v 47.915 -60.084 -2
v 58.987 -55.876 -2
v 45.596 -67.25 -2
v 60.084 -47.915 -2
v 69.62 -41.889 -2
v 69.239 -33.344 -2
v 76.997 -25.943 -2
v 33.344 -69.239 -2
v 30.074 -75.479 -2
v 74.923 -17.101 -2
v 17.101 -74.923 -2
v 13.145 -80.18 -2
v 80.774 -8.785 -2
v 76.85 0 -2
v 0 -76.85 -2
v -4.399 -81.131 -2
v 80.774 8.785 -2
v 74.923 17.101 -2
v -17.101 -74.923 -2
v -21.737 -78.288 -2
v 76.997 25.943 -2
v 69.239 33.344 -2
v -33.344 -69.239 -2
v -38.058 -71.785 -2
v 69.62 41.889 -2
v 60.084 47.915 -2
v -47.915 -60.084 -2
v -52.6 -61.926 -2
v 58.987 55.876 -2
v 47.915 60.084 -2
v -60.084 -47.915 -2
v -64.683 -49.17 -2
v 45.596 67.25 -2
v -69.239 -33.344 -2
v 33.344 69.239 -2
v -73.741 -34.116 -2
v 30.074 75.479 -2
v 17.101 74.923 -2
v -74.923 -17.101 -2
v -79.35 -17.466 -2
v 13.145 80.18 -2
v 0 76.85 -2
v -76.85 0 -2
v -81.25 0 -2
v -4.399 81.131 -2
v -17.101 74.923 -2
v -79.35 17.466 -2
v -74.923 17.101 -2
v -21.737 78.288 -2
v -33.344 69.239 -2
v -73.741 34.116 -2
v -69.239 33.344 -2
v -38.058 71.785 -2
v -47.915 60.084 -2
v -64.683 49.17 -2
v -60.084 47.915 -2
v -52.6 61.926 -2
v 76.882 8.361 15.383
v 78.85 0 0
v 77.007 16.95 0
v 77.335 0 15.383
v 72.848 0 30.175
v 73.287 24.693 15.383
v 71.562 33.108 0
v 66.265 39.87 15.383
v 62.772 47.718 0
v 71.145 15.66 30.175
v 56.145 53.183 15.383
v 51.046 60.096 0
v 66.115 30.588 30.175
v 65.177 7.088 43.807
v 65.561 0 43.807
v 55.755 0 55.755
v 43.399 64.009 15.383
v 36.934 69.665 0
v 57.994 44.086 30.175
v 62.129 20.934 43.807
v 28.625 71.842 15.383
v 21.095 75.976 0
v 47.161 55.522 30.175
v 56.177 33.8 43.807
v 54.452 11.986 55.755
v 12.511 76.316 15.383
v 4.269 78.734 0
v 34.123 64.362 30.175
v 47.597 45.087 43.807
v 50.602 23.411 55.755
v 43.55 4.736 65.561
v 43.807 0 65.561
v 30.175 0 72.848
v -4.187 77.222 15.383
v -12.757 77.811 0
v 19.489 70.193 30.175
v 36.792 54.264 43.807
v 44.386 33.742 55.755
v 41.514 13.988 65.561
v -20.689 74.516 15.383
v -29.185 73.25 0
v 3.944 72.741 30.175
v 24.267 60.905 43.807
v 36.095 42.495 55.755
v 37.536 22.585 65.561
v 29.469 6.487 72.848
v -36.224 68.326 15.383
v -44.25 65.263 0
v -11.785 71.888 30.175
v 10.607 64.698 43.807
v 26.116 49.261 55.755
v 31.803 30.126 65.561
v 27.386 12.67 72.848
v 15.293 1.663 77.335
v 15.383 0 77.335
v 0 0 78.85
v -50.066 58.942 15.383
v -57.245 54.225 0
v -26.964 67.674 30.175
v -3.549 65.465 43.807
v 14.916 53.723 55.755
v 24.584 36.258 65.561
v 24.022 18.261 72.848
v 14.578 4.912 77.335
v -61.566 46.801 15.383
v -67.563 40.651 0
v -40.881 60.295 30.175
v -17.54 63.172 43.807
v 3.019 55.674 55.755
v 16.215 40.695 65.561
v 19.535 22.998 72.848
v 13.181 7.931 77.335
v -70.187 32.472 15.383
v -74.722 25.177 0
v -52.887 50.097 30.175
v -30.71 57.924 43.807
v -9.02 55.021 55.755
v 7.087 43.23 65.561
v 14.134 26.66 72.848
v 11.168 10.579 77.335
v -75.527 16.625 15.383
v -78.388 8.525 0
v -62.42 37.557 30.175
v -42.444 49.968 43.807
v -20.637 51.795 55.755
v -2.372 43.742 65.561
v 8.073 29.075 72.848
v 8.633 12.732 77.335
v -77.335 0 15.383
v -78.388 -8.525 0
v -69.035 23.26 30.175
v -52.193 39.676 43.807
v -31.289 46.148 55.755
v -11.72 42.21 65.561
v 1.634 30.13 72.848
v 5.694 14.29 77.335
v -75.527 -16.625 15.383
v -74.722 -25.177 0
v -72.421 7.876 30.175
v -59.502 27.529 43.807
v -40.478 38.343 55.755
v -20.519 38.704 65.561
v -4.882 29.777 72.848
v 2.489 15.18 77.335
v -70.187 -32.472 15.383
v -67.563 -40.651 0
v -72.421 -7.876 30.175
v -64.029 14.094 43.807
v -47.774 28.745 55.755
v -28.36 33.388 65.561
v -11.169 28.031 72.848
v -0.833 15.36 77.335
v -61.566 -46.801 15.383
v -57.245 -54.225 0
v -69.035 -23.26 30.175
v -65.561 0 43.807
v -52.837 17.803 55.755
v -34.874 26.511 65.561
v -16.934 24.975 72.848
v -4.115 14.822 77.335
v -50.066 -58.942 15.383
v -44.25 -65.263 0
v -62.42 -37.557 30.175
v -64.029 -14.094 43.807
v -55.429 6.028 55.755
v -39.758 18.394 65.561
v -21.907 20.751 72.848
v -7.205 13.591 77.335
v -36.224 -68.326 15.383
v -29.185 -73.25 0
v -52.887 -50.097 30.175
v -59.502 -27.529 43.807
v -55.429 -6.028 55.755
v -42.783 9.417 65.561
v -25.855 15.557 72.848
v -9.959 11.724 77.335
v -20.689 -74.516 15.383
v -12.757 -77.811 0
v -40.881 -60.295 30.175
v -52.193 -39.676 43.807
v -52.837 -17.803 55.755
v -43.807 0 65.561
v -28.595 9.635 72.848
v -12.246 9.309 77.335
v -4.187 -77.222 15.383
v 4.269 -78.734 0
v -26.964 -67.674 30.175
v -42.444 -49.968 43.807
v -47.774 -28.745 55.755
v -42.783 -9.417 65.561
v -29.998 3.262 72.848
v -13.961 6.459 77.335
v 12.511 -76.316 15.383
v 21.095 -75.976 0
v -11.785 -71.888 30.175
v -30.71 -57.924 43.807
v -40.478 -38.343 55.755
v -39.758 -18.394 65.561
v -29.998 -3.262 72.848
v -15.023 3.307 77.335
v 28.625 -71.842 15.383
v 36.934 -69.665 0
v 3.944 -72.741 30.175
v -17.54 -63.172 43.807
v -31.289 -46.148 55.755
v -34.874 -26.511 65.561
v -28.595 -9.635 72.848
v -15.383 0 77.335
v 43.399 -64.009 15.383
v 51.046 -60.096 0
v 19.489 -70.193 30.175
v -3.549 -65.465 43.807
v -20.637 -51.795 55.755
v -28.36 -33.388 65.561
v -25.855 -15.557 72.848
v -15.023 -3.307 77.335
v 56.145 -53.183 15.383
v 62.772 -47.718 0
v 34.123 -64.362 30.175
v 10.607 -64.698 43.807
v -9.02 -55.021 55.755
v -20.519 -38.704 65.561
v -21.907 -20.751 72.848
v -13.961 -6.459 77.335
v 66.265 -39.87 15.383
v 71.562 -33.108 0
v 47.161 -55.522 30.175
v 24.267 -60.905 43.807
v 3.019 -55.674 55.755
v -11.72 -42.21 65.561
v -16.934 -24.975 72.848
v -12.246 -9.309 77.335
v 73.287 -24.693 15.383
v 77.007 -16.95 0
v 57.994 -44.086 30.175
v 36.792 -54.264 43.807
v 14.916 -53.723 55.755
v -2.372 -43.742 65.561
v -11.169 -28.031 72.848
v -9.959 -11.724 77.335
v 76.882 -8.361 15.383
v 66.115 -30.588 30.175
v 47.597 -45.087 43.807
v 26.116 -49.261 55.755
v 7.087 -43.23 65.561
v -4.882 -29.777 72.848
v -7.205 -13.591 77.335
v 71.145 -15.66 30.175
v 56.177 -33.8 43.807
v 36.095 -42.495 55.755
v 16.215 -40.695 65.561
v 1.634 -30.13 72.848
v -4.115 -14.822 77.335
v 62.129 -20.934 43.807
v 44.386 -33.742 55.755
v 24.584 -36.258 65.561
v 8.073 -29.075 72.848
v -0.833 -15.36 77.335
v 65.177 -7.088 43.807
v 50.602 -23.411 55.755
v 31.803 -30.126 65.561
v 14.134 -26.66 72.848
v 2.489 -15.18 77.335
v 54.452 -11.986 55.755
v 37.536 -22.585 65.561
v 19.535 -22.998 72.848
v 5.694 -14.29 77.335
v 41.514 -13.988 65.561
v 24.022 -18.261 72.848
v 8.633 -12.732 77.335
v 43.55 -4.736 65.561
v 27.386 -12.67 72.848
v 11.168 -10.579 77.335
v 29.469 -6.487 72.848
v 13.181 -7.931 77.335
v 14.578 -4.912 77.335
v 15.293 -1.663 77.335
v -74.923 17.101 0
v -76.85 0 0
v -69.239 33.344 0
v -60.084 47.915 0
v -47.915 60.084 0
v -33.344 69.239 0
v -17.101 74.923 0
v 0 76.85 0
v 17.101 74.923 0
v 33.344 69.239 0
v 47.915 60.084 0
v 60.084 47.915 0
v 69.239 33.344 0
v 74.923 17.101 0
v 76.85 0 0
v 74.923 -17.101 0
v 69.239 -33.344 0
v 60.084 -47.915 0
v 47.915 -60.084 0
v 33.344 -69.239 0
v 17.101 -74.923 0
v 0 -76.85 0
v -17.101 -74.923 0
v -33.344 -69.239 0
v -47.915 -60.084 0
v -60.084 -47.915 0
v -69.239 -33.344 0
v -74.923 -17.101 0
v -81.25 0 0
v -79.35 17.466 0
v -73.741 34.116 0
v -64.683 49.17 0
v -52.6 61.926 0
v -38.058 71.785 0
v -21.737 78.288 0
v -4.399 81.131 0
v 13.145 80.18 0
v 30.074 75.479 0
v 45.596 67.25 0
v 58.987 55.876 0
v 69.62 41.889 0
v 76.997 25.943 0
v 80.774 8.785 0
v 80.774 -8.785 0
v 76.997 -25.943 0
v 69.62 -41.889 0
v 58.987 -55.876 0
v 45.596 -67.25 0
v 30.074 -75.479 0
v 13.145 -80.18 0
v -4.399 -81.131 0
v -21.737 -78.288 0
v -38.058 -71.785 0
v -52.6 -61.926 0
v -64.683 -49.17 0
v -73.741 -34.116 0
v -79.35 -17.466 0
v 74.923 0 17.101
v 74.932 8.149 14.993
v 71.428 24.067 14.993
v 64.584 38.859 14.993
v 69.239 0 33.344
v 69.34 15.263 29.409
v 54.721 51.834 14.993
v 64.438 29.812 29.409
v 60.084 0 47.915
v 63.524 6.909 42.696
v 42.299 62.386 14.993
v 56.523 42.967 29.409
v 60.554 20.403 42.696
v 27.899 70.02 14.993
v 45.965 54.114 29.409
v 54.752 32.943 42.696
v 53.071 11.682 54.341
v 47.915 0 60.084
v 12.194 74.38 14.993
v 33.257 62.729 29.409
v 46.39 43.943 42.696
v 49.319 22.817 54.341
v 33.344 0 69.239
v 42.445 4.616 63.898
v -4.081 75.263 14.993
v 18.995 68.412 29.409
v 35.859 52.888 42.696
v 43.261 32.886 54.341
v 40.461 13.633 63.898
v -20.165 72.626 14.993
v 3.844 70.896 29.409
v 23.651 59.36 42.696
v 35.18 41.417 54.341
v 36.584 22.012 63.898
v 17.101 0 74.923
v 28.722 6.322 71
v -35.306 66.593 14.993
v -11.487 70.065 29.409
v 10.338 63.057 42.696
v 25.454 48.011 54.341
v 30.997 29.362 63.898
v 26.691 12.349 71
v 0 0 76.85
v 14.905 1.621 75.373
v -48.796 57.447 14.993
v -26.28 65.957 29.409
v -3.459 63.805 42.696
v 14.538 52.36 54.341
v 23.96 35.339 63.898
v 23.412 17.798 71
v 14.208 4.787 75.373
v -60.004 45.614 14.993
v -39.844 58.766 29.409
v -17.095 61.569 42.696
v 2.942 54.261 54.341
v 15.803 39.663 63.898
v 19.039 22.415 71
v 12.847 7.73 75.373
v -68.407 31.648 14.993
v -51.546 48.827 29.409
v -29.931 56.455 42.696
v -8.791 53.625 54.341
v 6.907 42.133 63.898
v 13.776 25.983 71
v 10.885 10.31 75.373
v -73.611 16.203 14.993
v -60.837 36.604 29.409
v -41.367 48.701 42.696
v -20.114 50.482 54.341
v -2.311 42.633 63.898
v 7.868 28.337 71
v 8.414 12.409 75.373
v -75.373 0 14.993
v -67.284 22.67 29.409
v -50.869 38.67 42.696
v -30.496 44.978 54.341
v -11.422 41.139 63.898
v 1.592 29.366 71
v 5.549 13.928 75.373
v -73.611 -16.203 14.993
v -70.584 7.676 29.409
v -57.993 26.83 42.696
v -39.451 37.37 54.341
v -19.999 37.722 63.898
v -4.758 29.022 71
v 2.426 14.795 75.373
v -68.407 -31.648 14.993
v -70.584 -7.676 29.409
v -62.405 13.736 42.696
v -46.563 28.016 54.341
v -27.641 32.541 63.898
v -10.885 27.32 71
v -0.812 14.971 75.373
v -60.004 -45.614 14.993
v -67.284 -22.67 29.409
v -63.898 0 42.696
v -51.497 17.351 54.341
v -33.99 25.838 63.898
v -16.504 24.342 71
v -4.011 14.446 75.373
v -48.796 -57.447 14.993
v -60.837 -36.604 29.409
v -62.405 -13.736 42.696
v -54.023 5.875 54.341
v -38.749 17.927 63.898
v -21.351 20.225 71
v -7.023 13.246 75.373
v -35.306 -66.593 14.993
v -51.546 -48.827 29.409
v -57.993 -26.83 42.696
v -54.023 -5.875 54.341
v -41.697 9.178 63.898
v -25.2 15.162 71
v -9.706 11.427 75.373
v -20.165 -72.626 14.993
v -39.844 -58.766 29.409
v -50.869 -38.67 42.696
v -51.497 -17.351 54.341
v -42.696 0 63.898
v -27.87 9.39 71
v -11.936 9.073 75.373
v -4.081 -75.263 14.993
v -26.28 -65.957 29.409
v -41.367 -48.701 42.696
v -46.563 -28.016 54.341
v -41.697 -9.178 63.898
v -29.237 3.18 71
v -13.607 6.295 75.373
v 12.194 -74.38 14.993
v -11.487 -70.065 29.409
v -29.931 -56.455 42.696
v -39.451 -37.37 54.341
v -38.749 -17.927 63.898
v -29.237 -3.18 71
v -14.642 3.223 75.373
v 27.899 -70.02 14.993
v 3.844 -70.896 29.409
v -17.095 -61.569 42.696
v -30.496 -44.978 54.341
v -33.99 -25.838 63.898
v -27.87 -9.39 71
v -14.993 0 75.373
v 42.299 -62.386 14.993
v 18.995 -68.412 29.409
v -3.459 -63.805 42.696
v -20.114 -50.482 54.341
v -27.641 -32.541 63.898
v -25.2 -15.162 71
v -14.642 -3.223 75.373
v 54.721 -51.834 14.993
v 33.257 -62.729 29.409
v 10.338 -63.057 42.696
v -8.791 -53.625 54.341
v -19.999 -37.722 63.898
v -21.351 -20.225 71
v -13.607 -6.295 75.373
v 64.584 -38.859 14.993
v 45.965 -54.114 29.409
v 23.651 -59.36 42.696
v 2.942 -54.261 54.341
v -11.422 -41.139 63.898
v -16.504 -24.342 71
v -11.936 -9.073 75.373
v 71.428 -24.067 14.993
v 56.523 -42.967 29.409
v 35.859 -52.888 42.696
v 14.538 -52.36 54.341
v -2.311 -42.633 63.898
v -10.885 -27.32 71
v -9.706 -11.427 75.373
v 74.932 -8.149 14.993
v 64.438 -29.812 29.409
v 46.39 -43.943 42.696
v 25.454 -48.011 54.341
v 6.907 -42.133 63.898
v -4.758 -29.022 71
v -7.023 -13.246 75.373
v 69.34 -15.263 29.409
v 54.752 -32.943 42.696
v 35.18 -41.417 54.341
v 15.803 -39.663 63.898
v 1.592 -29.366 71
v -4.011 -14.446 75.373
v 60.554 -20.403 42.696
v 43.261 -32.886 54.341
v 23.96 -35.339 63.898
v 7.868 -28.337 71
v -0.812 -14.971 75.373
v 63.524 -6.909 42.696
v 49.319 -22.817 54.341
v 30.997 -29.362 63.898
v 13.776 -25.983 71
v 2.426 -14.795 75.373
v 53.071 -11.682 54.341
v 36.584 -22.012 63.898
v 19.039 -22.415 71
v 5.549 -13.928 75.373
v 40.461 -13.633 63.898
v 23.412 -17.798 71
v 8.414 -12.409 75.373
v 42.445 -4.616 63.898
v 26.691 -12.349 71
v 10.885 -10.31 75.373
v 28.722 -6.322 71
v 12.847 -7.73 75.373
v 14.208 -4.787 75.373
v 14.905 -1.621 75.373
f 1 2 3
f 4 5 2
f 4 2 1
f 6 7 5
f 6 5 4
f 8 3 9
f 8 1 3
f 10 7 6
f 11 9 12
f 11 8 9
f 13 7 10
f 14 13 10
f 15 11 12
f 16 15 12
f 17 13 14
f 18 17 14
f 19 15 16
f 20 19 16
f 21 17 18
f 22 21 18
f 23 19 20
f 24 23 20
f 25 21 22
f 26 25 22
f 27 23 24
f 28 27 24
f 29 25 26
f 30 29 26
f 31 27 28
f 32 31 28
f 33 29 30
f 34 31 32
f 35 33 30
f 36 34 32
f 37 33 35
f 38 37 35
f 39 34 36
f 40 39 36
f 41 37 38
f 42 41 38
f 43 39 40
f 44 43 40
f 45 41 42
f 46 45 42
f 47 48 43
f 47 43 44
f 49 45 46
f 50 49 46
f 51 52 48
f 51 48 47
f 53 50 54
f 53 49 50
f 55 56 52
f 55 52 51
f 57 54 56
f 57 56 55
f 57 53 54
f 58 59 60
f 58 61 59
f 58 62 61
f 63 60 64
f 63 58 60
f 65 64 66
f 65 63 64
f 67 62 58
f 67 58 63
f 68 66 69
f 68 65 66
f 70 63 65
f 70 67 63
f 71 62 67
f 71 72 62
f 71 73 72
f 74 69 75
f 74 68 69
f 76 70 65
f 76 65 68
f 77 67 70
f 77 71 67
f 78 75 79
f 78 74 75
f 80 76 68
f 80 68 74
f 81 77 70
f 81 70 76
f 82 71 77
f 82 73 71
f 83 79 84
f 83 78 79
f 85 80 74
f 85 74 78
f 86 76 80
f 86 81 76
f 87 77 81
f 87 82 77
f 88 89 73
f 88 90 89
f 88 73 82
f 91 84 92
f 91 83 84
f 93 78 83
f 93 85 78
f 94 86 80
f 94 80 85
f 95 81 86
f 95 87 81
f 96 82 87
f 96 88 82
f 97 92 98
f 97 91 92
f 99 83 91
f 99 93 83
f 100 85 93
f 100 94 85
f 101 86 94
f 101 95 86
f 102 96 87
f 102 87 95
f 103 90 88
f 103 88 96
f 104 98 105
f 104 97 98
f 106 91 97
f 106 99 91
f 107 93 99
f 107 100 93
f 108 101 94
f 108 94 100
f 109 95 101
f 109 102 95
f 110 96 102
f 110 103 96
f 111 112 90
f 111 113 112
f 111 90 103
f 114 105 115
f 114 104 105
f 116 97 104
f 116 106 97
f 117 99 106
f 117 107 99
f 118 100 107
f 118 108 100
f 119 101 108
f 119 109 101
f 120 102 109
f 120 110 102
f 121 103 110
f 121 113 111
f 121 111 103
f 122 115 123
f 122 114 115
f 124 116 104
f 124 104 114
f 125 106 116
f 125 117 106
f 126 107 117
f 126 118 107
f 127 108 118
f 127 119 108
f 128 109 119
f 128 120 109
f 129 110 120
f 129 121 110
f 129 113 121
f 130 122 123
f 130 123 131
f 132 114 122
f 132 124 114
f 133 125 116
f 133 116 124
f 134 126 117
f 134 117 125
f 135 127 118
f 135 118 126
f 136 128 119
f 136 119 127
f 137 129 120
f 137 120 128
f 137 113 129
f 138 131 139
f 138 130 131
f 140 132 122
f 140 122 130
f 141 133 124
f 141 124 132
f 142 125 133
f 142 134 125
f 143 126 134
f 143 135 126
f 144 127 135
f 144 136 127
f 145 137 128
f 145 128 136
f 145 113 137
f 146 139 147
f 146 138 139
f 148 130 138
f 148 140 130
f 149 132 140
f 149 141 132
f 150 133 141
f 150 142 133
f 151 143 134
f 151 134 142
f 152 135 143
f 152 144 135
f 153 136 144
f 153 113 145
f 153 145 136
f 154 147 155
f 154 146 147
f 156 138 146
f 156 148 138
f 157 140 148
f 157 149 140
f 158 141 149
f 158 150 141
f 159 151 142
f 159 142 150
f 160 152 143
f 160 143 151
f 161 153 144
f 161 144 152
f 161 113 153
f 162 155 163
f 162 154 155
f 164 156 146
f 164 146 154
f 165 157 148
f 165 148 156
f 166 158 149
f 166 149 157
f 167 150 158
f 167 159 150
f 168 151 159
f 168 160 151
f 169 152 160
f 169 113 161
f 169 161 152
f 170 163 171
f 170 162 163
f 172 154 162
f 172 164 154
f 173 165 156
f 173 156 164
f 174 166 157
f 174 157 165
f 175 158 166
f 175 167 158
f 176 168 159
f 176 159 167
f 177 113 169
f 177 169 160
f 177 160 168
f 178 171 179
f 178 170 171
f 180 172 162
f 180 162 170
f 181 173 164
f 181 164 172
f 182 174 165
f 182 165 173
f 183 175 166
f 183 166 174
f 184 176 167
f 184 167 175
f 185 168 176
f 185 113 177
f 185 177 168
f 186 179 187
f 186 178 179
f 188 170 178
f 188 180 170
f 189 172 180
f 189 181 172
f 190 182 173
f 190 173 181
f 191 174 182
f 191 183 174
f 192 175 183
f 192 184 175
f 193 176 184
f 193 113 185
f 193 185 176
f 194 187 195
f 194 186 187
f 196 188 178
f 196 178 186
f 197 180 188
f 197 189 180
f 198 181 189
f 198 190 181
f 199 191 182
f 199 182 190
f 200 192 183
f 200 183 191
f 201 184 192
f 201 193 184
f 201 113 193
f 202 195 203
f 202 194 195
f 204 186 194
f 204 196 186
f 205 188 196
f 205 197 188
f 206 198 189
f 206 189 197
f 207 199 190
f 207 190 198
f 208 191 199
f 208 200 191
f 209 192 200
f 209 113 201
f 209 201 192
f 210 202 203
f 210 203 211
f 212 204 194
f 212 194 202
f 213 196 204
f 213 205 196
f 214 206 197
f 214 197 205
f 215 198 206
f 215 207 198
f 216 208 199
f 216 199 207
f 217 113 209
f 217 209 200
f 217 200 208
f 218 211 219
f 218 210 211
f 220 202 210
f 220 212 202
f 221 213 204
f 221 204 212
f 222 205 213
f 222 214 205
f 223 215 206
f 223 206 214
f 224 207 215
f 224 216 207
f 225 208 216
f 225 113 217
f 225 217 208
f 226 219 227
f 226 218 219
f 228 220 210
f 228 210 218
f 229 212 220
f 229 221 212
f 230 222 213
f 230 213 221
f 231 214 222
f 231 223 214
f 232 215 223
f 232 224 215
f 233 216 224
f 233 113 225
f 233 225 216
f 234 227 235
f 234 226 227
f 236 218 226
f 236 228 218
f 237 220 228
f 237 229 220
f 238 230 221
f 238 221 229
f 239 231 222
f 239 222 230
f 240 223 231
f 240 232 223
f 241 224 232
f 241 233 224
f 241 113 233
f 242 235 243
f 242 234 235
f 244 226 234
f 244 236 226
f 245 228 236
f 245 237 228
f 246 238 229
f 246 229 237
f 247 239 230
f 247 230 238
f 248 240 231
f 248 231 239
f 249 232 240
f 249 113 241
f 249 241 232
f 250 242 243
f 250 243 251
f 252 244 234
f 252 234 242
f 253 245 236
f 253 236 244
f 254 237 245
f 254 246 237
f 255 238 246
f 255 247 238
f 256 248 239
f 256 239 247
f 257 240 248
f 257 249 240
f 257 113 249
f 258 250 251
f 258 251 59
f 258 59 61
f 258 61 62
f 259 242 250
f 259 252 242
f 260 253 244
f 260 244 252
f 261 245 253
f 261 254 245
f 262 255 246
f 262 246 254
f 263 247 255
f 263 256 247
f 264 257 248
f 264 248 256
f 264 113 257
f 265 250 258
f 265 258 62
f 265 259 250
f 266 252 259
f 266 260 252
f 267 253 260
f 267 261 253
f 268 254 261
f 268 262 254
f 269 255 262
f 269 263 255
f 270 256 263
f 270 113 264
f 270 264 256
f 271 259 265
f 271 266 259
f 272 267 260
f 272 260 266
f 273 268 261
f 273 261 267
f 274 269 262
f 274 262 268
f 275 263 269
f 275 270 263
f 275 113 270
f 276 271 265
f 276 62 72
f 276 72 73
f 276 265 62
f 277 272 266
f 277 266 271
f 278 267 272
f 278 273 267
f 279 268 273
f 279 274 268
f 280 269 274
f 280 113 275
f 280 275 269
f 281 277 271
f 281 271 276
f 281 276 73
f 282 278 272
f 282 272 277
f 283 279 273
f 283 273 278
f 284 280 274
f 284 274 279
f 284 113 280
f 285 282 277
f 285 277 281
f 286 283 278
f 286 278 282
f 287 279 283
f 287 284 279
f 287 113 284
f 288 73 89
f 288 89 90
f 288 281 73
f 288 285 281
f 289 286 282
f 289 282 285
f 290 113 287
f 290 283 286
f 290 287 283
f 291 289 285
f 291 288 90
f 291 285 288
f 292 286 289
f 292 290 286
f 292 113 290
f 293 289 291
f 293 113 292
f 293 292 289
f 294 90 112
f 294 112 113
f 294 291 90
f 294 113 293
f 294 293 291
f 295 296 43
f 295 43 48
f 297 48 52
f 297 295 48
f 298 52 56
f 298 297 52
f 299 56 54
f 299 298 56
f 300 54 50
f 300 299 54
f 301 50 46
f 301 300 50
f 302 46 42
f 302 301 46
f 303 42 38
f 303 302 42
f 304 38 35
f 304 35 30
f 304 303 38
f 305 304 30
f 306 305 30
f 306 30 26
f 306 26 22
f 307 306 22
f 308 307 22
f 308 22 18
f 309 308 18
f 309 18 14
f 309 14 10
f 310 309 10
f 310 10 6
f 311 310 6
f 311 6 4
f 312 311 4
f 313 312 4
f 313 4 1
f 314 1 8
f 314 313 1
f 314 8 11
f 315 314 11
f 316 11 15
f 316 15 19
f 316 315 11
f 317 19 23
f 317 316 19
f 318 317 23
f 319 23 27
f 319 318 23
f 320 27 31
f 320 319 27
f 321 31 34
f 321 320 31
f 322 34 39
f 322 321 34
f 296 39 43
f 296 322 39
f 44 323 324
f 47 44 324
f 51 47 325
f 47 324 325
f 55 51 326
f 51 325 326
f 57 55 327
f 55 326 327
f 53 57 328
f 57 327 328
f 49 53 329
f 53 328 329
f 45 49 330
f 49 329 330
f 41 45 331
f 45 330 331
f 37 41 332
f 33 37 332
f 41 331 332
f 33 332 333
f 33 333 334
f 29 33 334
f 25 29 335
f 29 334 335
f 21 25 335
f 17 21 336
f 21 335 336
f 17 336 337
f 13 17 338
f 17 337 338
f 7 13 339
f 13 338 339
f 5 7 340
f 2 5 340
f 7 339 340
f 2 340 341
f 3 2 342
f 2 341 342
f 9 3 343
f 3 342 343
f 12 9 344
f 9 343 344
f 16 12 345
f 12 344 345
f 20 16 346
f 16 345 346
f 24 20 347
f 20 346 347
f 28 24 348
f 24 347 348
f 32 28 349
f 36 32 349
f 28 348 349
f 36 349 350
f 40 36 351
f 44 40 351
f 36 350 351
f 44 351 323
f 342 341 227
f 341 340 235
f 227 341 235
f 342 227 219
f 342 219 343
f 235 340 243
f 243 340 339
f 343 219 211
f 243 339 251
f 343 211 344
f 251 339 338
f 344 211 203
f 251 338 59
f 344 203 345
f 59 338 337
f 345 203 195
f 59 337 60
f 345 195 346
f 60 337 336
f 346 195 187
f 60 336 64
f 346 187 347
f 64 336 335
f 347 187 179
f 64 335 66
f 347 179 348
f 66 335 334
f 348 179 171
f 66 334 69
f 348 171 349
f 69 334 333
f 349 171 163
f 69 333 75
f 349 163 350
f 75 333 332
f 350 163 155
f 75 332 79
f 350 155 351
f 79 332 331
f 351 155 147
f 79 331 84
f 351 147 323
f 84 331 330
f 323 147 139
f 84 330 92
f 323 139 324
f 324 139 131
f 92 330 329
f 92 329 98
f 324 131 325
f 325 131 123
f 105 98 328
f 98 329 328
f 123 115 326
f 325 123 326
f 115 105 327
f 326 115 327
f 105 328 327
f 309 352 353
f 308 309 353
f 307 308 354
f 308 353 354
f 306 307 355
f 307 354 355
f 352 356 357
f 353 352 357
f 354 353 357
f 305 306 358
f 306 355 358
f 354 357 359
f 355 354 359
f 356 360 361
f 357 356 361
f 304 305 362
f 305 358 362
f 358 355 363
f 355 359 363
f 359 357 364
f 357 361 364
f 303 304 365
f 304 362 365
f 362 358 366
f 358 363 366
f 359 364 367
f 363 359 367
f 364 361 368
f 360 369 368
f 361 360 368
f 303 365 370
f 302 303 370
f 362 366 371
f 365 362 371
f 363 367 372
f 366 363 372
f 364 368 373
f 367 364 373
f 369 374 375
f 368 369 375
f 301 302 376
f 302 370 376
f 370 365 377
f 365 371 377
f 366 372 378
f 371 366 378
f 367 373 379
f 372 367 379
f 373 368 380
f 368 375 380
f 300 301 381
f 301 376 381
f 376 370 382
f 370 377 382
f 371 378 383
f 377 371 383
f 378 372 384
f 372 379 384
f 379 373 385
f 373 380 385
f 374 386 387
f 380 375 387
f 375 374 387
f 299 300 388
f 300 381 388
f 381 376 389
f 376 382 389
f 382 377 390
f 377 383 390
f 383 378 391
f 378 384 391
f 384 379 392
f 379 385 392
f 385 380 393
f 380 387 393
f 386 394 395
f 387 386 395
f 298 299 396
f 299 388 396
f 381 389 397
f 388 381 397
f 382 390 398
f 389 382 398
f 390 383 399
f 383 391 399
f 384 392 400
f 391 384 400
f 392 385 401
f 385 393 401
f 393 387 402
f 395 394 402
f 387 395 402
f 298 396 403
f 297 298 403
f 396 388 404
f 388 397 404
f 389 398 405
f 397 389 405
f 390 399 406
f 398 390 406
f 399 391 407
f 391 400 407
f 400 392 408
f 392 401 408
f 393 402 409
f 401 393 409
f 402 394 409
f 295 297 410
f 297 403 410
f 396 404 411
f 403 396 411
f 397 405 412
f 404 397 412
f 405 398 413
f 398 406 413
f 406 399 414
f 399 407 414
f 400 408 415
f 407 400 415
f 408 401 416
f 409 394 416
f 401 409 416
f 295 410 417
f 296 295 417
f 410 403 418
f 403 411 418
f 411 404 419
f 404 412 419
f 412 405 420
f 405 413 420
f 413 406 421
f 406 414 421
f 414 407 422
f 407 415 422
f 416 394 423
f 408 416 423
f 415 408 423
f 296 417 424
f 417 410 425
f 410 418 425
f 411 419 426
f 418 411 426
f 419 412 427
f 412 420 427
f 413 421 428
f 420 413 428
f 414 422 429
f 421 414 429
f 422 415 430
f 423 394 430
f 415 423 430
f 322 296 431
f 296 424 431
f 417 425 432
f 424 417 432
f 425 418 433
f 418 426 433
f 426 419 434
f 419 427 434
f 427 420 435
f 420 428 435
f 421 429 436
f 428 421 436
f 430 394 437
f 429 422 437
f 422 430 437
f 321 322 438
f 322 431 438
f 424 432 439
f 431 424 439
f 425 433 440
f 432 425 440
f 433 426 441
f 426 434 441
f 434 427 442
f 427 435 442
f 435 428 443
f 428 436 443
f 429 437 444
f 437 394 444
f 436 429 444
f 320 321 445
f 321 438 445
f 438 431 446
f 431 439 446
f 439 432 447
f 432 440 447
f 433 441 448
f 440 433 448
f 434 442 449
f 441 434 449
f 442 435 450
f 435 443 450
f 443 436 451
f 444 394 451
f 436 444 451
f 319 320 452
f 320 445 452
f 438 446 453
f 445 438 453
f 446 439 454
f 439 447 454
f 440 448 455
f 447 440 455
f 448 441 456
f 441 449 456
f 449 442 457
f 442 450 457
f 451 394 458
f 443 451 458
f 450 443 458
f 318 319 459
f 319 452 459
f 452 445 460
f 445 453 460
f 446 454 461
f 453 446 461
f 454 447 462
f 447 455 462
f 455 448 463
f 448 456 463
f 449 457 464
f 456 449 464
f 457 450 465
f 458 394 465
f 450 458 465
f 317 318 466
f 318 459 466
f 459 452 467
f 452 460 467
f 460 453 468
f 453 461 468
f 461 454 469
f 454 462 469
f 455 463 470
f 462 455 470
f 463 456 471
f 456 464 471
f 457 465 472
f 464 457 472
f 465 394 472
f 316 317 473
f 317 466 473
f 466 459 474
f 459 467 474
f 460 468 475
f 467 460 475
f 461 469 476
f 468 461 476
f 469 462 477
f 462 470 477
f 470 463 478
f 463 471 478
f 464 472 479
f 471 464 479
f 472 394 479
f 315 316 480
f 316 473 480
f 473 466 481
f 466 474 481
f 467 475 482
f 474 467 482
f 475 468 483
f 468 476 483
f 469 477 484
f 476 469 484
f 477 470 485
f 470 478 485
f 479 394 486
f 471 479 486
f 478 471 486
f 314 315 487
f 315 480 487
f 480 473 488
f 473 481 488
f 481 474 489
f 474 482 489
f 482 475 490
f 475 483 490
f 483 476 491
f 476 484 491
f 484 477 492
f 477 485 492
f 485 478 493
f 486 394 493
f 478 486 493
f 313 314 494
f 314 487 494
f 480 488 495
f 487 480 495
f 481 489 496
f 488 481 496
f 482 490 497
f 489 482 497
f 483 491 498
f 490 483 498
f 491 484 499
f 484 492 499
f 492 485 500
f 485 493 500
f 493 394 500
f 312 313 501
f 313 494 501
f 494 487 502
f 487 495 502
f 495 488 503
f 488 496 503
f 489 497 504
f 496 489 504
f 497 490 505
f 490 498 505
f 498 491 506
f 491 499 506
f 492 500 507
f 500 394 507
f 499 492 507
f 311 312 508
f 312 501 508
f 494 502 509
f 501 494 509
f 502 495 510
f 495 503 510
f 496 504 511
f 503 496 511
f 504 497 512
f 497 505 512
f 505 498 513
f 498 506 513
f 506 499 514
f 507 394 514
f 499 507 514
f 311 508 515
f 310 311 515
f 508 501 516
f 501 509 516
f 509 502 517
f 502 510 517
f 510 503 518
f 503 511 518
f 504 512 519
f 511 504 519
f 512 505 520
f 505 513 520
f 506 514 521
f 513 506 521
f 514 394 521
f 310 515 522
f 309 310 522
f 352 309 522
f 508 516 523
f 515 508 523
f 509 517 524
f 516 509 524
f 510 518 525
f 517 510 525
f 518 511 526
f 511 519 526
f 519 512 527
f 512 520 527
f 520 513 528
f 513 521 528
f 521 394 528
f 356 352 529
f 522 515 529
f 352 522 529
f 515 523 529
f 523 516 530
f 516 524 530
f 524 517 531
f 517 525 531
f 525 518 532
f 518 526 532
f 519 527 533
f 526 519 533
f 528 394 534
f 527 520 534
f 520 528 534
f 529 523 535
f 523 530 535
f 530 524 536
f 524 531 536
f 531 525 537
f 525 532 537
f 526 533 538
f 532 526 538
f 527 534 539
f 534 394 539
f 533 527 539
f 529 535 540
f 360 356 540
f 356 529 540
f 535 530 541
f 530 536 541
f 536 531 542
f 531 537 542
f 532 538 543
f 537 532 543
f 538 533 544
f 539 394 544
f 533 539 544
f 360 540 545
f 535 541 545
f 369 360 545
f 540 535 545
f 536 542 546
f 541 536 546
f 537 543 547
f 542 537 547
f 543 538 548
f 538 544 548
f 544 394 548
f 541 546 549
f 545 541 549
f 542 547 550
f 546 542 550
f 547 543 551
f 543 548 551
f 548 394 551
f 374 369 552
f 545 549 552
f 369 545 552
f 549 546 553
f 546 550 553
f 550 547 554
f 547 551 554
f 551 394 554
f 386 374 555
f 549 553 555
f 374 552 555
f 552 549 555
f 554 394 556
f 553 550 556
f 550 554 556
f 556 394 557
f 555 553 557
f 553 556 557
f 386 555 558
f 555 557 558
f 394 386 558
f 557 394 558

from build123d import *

# Parameters (mm, degrees)
SHELL1_T            = -2
SKETCH2_R           = 81.25
SKETCH2_R_2         = 76.85
BOSS_EXTRUDE1_DEPTH = 2


# Read off the part's stored shape, not the designer's step: Revolve1
with BuildPart() as part:
    # Revolve1 outline → Revolve1 (revolve)
    with BuildSketch(Plane.XZ):
        with BuildLine():
            Line((0, 0), (78.85, -7.9e-08))
            ThreePointArc((78.85, -7.9e-08), (55.755369724, 55.755369669), (0, 78.85))
            Line((0, 78.85), (0, 0))
        make_face()
    revolve(axis=Axis((0, 0, 0), (0, 0, 1)))

    # Shell1
    shell1_openings = [part.faces().sort_by_distance(p)[0] for p in [
        (0, 0, 0),
    ]]
    offset(amount=SHELL1_T, openings=shell1_openings, kind=Kind.INTERSECTION)

    # Sketch2 → Boss-Extrude1 (add)
    with BuildSketch(Plane(origin=(0, 0, 0), x_dir=(-1, 0, 0), z_dir=(0, 0, -1))):
        Circle(SKETCH2_R)
        Circle(SKETCH2_R_2, mode=Mode.SUBTRACT)
    extrude(amount=BOSS_EXTRUDE1_DEPTH)


solid = part.part
